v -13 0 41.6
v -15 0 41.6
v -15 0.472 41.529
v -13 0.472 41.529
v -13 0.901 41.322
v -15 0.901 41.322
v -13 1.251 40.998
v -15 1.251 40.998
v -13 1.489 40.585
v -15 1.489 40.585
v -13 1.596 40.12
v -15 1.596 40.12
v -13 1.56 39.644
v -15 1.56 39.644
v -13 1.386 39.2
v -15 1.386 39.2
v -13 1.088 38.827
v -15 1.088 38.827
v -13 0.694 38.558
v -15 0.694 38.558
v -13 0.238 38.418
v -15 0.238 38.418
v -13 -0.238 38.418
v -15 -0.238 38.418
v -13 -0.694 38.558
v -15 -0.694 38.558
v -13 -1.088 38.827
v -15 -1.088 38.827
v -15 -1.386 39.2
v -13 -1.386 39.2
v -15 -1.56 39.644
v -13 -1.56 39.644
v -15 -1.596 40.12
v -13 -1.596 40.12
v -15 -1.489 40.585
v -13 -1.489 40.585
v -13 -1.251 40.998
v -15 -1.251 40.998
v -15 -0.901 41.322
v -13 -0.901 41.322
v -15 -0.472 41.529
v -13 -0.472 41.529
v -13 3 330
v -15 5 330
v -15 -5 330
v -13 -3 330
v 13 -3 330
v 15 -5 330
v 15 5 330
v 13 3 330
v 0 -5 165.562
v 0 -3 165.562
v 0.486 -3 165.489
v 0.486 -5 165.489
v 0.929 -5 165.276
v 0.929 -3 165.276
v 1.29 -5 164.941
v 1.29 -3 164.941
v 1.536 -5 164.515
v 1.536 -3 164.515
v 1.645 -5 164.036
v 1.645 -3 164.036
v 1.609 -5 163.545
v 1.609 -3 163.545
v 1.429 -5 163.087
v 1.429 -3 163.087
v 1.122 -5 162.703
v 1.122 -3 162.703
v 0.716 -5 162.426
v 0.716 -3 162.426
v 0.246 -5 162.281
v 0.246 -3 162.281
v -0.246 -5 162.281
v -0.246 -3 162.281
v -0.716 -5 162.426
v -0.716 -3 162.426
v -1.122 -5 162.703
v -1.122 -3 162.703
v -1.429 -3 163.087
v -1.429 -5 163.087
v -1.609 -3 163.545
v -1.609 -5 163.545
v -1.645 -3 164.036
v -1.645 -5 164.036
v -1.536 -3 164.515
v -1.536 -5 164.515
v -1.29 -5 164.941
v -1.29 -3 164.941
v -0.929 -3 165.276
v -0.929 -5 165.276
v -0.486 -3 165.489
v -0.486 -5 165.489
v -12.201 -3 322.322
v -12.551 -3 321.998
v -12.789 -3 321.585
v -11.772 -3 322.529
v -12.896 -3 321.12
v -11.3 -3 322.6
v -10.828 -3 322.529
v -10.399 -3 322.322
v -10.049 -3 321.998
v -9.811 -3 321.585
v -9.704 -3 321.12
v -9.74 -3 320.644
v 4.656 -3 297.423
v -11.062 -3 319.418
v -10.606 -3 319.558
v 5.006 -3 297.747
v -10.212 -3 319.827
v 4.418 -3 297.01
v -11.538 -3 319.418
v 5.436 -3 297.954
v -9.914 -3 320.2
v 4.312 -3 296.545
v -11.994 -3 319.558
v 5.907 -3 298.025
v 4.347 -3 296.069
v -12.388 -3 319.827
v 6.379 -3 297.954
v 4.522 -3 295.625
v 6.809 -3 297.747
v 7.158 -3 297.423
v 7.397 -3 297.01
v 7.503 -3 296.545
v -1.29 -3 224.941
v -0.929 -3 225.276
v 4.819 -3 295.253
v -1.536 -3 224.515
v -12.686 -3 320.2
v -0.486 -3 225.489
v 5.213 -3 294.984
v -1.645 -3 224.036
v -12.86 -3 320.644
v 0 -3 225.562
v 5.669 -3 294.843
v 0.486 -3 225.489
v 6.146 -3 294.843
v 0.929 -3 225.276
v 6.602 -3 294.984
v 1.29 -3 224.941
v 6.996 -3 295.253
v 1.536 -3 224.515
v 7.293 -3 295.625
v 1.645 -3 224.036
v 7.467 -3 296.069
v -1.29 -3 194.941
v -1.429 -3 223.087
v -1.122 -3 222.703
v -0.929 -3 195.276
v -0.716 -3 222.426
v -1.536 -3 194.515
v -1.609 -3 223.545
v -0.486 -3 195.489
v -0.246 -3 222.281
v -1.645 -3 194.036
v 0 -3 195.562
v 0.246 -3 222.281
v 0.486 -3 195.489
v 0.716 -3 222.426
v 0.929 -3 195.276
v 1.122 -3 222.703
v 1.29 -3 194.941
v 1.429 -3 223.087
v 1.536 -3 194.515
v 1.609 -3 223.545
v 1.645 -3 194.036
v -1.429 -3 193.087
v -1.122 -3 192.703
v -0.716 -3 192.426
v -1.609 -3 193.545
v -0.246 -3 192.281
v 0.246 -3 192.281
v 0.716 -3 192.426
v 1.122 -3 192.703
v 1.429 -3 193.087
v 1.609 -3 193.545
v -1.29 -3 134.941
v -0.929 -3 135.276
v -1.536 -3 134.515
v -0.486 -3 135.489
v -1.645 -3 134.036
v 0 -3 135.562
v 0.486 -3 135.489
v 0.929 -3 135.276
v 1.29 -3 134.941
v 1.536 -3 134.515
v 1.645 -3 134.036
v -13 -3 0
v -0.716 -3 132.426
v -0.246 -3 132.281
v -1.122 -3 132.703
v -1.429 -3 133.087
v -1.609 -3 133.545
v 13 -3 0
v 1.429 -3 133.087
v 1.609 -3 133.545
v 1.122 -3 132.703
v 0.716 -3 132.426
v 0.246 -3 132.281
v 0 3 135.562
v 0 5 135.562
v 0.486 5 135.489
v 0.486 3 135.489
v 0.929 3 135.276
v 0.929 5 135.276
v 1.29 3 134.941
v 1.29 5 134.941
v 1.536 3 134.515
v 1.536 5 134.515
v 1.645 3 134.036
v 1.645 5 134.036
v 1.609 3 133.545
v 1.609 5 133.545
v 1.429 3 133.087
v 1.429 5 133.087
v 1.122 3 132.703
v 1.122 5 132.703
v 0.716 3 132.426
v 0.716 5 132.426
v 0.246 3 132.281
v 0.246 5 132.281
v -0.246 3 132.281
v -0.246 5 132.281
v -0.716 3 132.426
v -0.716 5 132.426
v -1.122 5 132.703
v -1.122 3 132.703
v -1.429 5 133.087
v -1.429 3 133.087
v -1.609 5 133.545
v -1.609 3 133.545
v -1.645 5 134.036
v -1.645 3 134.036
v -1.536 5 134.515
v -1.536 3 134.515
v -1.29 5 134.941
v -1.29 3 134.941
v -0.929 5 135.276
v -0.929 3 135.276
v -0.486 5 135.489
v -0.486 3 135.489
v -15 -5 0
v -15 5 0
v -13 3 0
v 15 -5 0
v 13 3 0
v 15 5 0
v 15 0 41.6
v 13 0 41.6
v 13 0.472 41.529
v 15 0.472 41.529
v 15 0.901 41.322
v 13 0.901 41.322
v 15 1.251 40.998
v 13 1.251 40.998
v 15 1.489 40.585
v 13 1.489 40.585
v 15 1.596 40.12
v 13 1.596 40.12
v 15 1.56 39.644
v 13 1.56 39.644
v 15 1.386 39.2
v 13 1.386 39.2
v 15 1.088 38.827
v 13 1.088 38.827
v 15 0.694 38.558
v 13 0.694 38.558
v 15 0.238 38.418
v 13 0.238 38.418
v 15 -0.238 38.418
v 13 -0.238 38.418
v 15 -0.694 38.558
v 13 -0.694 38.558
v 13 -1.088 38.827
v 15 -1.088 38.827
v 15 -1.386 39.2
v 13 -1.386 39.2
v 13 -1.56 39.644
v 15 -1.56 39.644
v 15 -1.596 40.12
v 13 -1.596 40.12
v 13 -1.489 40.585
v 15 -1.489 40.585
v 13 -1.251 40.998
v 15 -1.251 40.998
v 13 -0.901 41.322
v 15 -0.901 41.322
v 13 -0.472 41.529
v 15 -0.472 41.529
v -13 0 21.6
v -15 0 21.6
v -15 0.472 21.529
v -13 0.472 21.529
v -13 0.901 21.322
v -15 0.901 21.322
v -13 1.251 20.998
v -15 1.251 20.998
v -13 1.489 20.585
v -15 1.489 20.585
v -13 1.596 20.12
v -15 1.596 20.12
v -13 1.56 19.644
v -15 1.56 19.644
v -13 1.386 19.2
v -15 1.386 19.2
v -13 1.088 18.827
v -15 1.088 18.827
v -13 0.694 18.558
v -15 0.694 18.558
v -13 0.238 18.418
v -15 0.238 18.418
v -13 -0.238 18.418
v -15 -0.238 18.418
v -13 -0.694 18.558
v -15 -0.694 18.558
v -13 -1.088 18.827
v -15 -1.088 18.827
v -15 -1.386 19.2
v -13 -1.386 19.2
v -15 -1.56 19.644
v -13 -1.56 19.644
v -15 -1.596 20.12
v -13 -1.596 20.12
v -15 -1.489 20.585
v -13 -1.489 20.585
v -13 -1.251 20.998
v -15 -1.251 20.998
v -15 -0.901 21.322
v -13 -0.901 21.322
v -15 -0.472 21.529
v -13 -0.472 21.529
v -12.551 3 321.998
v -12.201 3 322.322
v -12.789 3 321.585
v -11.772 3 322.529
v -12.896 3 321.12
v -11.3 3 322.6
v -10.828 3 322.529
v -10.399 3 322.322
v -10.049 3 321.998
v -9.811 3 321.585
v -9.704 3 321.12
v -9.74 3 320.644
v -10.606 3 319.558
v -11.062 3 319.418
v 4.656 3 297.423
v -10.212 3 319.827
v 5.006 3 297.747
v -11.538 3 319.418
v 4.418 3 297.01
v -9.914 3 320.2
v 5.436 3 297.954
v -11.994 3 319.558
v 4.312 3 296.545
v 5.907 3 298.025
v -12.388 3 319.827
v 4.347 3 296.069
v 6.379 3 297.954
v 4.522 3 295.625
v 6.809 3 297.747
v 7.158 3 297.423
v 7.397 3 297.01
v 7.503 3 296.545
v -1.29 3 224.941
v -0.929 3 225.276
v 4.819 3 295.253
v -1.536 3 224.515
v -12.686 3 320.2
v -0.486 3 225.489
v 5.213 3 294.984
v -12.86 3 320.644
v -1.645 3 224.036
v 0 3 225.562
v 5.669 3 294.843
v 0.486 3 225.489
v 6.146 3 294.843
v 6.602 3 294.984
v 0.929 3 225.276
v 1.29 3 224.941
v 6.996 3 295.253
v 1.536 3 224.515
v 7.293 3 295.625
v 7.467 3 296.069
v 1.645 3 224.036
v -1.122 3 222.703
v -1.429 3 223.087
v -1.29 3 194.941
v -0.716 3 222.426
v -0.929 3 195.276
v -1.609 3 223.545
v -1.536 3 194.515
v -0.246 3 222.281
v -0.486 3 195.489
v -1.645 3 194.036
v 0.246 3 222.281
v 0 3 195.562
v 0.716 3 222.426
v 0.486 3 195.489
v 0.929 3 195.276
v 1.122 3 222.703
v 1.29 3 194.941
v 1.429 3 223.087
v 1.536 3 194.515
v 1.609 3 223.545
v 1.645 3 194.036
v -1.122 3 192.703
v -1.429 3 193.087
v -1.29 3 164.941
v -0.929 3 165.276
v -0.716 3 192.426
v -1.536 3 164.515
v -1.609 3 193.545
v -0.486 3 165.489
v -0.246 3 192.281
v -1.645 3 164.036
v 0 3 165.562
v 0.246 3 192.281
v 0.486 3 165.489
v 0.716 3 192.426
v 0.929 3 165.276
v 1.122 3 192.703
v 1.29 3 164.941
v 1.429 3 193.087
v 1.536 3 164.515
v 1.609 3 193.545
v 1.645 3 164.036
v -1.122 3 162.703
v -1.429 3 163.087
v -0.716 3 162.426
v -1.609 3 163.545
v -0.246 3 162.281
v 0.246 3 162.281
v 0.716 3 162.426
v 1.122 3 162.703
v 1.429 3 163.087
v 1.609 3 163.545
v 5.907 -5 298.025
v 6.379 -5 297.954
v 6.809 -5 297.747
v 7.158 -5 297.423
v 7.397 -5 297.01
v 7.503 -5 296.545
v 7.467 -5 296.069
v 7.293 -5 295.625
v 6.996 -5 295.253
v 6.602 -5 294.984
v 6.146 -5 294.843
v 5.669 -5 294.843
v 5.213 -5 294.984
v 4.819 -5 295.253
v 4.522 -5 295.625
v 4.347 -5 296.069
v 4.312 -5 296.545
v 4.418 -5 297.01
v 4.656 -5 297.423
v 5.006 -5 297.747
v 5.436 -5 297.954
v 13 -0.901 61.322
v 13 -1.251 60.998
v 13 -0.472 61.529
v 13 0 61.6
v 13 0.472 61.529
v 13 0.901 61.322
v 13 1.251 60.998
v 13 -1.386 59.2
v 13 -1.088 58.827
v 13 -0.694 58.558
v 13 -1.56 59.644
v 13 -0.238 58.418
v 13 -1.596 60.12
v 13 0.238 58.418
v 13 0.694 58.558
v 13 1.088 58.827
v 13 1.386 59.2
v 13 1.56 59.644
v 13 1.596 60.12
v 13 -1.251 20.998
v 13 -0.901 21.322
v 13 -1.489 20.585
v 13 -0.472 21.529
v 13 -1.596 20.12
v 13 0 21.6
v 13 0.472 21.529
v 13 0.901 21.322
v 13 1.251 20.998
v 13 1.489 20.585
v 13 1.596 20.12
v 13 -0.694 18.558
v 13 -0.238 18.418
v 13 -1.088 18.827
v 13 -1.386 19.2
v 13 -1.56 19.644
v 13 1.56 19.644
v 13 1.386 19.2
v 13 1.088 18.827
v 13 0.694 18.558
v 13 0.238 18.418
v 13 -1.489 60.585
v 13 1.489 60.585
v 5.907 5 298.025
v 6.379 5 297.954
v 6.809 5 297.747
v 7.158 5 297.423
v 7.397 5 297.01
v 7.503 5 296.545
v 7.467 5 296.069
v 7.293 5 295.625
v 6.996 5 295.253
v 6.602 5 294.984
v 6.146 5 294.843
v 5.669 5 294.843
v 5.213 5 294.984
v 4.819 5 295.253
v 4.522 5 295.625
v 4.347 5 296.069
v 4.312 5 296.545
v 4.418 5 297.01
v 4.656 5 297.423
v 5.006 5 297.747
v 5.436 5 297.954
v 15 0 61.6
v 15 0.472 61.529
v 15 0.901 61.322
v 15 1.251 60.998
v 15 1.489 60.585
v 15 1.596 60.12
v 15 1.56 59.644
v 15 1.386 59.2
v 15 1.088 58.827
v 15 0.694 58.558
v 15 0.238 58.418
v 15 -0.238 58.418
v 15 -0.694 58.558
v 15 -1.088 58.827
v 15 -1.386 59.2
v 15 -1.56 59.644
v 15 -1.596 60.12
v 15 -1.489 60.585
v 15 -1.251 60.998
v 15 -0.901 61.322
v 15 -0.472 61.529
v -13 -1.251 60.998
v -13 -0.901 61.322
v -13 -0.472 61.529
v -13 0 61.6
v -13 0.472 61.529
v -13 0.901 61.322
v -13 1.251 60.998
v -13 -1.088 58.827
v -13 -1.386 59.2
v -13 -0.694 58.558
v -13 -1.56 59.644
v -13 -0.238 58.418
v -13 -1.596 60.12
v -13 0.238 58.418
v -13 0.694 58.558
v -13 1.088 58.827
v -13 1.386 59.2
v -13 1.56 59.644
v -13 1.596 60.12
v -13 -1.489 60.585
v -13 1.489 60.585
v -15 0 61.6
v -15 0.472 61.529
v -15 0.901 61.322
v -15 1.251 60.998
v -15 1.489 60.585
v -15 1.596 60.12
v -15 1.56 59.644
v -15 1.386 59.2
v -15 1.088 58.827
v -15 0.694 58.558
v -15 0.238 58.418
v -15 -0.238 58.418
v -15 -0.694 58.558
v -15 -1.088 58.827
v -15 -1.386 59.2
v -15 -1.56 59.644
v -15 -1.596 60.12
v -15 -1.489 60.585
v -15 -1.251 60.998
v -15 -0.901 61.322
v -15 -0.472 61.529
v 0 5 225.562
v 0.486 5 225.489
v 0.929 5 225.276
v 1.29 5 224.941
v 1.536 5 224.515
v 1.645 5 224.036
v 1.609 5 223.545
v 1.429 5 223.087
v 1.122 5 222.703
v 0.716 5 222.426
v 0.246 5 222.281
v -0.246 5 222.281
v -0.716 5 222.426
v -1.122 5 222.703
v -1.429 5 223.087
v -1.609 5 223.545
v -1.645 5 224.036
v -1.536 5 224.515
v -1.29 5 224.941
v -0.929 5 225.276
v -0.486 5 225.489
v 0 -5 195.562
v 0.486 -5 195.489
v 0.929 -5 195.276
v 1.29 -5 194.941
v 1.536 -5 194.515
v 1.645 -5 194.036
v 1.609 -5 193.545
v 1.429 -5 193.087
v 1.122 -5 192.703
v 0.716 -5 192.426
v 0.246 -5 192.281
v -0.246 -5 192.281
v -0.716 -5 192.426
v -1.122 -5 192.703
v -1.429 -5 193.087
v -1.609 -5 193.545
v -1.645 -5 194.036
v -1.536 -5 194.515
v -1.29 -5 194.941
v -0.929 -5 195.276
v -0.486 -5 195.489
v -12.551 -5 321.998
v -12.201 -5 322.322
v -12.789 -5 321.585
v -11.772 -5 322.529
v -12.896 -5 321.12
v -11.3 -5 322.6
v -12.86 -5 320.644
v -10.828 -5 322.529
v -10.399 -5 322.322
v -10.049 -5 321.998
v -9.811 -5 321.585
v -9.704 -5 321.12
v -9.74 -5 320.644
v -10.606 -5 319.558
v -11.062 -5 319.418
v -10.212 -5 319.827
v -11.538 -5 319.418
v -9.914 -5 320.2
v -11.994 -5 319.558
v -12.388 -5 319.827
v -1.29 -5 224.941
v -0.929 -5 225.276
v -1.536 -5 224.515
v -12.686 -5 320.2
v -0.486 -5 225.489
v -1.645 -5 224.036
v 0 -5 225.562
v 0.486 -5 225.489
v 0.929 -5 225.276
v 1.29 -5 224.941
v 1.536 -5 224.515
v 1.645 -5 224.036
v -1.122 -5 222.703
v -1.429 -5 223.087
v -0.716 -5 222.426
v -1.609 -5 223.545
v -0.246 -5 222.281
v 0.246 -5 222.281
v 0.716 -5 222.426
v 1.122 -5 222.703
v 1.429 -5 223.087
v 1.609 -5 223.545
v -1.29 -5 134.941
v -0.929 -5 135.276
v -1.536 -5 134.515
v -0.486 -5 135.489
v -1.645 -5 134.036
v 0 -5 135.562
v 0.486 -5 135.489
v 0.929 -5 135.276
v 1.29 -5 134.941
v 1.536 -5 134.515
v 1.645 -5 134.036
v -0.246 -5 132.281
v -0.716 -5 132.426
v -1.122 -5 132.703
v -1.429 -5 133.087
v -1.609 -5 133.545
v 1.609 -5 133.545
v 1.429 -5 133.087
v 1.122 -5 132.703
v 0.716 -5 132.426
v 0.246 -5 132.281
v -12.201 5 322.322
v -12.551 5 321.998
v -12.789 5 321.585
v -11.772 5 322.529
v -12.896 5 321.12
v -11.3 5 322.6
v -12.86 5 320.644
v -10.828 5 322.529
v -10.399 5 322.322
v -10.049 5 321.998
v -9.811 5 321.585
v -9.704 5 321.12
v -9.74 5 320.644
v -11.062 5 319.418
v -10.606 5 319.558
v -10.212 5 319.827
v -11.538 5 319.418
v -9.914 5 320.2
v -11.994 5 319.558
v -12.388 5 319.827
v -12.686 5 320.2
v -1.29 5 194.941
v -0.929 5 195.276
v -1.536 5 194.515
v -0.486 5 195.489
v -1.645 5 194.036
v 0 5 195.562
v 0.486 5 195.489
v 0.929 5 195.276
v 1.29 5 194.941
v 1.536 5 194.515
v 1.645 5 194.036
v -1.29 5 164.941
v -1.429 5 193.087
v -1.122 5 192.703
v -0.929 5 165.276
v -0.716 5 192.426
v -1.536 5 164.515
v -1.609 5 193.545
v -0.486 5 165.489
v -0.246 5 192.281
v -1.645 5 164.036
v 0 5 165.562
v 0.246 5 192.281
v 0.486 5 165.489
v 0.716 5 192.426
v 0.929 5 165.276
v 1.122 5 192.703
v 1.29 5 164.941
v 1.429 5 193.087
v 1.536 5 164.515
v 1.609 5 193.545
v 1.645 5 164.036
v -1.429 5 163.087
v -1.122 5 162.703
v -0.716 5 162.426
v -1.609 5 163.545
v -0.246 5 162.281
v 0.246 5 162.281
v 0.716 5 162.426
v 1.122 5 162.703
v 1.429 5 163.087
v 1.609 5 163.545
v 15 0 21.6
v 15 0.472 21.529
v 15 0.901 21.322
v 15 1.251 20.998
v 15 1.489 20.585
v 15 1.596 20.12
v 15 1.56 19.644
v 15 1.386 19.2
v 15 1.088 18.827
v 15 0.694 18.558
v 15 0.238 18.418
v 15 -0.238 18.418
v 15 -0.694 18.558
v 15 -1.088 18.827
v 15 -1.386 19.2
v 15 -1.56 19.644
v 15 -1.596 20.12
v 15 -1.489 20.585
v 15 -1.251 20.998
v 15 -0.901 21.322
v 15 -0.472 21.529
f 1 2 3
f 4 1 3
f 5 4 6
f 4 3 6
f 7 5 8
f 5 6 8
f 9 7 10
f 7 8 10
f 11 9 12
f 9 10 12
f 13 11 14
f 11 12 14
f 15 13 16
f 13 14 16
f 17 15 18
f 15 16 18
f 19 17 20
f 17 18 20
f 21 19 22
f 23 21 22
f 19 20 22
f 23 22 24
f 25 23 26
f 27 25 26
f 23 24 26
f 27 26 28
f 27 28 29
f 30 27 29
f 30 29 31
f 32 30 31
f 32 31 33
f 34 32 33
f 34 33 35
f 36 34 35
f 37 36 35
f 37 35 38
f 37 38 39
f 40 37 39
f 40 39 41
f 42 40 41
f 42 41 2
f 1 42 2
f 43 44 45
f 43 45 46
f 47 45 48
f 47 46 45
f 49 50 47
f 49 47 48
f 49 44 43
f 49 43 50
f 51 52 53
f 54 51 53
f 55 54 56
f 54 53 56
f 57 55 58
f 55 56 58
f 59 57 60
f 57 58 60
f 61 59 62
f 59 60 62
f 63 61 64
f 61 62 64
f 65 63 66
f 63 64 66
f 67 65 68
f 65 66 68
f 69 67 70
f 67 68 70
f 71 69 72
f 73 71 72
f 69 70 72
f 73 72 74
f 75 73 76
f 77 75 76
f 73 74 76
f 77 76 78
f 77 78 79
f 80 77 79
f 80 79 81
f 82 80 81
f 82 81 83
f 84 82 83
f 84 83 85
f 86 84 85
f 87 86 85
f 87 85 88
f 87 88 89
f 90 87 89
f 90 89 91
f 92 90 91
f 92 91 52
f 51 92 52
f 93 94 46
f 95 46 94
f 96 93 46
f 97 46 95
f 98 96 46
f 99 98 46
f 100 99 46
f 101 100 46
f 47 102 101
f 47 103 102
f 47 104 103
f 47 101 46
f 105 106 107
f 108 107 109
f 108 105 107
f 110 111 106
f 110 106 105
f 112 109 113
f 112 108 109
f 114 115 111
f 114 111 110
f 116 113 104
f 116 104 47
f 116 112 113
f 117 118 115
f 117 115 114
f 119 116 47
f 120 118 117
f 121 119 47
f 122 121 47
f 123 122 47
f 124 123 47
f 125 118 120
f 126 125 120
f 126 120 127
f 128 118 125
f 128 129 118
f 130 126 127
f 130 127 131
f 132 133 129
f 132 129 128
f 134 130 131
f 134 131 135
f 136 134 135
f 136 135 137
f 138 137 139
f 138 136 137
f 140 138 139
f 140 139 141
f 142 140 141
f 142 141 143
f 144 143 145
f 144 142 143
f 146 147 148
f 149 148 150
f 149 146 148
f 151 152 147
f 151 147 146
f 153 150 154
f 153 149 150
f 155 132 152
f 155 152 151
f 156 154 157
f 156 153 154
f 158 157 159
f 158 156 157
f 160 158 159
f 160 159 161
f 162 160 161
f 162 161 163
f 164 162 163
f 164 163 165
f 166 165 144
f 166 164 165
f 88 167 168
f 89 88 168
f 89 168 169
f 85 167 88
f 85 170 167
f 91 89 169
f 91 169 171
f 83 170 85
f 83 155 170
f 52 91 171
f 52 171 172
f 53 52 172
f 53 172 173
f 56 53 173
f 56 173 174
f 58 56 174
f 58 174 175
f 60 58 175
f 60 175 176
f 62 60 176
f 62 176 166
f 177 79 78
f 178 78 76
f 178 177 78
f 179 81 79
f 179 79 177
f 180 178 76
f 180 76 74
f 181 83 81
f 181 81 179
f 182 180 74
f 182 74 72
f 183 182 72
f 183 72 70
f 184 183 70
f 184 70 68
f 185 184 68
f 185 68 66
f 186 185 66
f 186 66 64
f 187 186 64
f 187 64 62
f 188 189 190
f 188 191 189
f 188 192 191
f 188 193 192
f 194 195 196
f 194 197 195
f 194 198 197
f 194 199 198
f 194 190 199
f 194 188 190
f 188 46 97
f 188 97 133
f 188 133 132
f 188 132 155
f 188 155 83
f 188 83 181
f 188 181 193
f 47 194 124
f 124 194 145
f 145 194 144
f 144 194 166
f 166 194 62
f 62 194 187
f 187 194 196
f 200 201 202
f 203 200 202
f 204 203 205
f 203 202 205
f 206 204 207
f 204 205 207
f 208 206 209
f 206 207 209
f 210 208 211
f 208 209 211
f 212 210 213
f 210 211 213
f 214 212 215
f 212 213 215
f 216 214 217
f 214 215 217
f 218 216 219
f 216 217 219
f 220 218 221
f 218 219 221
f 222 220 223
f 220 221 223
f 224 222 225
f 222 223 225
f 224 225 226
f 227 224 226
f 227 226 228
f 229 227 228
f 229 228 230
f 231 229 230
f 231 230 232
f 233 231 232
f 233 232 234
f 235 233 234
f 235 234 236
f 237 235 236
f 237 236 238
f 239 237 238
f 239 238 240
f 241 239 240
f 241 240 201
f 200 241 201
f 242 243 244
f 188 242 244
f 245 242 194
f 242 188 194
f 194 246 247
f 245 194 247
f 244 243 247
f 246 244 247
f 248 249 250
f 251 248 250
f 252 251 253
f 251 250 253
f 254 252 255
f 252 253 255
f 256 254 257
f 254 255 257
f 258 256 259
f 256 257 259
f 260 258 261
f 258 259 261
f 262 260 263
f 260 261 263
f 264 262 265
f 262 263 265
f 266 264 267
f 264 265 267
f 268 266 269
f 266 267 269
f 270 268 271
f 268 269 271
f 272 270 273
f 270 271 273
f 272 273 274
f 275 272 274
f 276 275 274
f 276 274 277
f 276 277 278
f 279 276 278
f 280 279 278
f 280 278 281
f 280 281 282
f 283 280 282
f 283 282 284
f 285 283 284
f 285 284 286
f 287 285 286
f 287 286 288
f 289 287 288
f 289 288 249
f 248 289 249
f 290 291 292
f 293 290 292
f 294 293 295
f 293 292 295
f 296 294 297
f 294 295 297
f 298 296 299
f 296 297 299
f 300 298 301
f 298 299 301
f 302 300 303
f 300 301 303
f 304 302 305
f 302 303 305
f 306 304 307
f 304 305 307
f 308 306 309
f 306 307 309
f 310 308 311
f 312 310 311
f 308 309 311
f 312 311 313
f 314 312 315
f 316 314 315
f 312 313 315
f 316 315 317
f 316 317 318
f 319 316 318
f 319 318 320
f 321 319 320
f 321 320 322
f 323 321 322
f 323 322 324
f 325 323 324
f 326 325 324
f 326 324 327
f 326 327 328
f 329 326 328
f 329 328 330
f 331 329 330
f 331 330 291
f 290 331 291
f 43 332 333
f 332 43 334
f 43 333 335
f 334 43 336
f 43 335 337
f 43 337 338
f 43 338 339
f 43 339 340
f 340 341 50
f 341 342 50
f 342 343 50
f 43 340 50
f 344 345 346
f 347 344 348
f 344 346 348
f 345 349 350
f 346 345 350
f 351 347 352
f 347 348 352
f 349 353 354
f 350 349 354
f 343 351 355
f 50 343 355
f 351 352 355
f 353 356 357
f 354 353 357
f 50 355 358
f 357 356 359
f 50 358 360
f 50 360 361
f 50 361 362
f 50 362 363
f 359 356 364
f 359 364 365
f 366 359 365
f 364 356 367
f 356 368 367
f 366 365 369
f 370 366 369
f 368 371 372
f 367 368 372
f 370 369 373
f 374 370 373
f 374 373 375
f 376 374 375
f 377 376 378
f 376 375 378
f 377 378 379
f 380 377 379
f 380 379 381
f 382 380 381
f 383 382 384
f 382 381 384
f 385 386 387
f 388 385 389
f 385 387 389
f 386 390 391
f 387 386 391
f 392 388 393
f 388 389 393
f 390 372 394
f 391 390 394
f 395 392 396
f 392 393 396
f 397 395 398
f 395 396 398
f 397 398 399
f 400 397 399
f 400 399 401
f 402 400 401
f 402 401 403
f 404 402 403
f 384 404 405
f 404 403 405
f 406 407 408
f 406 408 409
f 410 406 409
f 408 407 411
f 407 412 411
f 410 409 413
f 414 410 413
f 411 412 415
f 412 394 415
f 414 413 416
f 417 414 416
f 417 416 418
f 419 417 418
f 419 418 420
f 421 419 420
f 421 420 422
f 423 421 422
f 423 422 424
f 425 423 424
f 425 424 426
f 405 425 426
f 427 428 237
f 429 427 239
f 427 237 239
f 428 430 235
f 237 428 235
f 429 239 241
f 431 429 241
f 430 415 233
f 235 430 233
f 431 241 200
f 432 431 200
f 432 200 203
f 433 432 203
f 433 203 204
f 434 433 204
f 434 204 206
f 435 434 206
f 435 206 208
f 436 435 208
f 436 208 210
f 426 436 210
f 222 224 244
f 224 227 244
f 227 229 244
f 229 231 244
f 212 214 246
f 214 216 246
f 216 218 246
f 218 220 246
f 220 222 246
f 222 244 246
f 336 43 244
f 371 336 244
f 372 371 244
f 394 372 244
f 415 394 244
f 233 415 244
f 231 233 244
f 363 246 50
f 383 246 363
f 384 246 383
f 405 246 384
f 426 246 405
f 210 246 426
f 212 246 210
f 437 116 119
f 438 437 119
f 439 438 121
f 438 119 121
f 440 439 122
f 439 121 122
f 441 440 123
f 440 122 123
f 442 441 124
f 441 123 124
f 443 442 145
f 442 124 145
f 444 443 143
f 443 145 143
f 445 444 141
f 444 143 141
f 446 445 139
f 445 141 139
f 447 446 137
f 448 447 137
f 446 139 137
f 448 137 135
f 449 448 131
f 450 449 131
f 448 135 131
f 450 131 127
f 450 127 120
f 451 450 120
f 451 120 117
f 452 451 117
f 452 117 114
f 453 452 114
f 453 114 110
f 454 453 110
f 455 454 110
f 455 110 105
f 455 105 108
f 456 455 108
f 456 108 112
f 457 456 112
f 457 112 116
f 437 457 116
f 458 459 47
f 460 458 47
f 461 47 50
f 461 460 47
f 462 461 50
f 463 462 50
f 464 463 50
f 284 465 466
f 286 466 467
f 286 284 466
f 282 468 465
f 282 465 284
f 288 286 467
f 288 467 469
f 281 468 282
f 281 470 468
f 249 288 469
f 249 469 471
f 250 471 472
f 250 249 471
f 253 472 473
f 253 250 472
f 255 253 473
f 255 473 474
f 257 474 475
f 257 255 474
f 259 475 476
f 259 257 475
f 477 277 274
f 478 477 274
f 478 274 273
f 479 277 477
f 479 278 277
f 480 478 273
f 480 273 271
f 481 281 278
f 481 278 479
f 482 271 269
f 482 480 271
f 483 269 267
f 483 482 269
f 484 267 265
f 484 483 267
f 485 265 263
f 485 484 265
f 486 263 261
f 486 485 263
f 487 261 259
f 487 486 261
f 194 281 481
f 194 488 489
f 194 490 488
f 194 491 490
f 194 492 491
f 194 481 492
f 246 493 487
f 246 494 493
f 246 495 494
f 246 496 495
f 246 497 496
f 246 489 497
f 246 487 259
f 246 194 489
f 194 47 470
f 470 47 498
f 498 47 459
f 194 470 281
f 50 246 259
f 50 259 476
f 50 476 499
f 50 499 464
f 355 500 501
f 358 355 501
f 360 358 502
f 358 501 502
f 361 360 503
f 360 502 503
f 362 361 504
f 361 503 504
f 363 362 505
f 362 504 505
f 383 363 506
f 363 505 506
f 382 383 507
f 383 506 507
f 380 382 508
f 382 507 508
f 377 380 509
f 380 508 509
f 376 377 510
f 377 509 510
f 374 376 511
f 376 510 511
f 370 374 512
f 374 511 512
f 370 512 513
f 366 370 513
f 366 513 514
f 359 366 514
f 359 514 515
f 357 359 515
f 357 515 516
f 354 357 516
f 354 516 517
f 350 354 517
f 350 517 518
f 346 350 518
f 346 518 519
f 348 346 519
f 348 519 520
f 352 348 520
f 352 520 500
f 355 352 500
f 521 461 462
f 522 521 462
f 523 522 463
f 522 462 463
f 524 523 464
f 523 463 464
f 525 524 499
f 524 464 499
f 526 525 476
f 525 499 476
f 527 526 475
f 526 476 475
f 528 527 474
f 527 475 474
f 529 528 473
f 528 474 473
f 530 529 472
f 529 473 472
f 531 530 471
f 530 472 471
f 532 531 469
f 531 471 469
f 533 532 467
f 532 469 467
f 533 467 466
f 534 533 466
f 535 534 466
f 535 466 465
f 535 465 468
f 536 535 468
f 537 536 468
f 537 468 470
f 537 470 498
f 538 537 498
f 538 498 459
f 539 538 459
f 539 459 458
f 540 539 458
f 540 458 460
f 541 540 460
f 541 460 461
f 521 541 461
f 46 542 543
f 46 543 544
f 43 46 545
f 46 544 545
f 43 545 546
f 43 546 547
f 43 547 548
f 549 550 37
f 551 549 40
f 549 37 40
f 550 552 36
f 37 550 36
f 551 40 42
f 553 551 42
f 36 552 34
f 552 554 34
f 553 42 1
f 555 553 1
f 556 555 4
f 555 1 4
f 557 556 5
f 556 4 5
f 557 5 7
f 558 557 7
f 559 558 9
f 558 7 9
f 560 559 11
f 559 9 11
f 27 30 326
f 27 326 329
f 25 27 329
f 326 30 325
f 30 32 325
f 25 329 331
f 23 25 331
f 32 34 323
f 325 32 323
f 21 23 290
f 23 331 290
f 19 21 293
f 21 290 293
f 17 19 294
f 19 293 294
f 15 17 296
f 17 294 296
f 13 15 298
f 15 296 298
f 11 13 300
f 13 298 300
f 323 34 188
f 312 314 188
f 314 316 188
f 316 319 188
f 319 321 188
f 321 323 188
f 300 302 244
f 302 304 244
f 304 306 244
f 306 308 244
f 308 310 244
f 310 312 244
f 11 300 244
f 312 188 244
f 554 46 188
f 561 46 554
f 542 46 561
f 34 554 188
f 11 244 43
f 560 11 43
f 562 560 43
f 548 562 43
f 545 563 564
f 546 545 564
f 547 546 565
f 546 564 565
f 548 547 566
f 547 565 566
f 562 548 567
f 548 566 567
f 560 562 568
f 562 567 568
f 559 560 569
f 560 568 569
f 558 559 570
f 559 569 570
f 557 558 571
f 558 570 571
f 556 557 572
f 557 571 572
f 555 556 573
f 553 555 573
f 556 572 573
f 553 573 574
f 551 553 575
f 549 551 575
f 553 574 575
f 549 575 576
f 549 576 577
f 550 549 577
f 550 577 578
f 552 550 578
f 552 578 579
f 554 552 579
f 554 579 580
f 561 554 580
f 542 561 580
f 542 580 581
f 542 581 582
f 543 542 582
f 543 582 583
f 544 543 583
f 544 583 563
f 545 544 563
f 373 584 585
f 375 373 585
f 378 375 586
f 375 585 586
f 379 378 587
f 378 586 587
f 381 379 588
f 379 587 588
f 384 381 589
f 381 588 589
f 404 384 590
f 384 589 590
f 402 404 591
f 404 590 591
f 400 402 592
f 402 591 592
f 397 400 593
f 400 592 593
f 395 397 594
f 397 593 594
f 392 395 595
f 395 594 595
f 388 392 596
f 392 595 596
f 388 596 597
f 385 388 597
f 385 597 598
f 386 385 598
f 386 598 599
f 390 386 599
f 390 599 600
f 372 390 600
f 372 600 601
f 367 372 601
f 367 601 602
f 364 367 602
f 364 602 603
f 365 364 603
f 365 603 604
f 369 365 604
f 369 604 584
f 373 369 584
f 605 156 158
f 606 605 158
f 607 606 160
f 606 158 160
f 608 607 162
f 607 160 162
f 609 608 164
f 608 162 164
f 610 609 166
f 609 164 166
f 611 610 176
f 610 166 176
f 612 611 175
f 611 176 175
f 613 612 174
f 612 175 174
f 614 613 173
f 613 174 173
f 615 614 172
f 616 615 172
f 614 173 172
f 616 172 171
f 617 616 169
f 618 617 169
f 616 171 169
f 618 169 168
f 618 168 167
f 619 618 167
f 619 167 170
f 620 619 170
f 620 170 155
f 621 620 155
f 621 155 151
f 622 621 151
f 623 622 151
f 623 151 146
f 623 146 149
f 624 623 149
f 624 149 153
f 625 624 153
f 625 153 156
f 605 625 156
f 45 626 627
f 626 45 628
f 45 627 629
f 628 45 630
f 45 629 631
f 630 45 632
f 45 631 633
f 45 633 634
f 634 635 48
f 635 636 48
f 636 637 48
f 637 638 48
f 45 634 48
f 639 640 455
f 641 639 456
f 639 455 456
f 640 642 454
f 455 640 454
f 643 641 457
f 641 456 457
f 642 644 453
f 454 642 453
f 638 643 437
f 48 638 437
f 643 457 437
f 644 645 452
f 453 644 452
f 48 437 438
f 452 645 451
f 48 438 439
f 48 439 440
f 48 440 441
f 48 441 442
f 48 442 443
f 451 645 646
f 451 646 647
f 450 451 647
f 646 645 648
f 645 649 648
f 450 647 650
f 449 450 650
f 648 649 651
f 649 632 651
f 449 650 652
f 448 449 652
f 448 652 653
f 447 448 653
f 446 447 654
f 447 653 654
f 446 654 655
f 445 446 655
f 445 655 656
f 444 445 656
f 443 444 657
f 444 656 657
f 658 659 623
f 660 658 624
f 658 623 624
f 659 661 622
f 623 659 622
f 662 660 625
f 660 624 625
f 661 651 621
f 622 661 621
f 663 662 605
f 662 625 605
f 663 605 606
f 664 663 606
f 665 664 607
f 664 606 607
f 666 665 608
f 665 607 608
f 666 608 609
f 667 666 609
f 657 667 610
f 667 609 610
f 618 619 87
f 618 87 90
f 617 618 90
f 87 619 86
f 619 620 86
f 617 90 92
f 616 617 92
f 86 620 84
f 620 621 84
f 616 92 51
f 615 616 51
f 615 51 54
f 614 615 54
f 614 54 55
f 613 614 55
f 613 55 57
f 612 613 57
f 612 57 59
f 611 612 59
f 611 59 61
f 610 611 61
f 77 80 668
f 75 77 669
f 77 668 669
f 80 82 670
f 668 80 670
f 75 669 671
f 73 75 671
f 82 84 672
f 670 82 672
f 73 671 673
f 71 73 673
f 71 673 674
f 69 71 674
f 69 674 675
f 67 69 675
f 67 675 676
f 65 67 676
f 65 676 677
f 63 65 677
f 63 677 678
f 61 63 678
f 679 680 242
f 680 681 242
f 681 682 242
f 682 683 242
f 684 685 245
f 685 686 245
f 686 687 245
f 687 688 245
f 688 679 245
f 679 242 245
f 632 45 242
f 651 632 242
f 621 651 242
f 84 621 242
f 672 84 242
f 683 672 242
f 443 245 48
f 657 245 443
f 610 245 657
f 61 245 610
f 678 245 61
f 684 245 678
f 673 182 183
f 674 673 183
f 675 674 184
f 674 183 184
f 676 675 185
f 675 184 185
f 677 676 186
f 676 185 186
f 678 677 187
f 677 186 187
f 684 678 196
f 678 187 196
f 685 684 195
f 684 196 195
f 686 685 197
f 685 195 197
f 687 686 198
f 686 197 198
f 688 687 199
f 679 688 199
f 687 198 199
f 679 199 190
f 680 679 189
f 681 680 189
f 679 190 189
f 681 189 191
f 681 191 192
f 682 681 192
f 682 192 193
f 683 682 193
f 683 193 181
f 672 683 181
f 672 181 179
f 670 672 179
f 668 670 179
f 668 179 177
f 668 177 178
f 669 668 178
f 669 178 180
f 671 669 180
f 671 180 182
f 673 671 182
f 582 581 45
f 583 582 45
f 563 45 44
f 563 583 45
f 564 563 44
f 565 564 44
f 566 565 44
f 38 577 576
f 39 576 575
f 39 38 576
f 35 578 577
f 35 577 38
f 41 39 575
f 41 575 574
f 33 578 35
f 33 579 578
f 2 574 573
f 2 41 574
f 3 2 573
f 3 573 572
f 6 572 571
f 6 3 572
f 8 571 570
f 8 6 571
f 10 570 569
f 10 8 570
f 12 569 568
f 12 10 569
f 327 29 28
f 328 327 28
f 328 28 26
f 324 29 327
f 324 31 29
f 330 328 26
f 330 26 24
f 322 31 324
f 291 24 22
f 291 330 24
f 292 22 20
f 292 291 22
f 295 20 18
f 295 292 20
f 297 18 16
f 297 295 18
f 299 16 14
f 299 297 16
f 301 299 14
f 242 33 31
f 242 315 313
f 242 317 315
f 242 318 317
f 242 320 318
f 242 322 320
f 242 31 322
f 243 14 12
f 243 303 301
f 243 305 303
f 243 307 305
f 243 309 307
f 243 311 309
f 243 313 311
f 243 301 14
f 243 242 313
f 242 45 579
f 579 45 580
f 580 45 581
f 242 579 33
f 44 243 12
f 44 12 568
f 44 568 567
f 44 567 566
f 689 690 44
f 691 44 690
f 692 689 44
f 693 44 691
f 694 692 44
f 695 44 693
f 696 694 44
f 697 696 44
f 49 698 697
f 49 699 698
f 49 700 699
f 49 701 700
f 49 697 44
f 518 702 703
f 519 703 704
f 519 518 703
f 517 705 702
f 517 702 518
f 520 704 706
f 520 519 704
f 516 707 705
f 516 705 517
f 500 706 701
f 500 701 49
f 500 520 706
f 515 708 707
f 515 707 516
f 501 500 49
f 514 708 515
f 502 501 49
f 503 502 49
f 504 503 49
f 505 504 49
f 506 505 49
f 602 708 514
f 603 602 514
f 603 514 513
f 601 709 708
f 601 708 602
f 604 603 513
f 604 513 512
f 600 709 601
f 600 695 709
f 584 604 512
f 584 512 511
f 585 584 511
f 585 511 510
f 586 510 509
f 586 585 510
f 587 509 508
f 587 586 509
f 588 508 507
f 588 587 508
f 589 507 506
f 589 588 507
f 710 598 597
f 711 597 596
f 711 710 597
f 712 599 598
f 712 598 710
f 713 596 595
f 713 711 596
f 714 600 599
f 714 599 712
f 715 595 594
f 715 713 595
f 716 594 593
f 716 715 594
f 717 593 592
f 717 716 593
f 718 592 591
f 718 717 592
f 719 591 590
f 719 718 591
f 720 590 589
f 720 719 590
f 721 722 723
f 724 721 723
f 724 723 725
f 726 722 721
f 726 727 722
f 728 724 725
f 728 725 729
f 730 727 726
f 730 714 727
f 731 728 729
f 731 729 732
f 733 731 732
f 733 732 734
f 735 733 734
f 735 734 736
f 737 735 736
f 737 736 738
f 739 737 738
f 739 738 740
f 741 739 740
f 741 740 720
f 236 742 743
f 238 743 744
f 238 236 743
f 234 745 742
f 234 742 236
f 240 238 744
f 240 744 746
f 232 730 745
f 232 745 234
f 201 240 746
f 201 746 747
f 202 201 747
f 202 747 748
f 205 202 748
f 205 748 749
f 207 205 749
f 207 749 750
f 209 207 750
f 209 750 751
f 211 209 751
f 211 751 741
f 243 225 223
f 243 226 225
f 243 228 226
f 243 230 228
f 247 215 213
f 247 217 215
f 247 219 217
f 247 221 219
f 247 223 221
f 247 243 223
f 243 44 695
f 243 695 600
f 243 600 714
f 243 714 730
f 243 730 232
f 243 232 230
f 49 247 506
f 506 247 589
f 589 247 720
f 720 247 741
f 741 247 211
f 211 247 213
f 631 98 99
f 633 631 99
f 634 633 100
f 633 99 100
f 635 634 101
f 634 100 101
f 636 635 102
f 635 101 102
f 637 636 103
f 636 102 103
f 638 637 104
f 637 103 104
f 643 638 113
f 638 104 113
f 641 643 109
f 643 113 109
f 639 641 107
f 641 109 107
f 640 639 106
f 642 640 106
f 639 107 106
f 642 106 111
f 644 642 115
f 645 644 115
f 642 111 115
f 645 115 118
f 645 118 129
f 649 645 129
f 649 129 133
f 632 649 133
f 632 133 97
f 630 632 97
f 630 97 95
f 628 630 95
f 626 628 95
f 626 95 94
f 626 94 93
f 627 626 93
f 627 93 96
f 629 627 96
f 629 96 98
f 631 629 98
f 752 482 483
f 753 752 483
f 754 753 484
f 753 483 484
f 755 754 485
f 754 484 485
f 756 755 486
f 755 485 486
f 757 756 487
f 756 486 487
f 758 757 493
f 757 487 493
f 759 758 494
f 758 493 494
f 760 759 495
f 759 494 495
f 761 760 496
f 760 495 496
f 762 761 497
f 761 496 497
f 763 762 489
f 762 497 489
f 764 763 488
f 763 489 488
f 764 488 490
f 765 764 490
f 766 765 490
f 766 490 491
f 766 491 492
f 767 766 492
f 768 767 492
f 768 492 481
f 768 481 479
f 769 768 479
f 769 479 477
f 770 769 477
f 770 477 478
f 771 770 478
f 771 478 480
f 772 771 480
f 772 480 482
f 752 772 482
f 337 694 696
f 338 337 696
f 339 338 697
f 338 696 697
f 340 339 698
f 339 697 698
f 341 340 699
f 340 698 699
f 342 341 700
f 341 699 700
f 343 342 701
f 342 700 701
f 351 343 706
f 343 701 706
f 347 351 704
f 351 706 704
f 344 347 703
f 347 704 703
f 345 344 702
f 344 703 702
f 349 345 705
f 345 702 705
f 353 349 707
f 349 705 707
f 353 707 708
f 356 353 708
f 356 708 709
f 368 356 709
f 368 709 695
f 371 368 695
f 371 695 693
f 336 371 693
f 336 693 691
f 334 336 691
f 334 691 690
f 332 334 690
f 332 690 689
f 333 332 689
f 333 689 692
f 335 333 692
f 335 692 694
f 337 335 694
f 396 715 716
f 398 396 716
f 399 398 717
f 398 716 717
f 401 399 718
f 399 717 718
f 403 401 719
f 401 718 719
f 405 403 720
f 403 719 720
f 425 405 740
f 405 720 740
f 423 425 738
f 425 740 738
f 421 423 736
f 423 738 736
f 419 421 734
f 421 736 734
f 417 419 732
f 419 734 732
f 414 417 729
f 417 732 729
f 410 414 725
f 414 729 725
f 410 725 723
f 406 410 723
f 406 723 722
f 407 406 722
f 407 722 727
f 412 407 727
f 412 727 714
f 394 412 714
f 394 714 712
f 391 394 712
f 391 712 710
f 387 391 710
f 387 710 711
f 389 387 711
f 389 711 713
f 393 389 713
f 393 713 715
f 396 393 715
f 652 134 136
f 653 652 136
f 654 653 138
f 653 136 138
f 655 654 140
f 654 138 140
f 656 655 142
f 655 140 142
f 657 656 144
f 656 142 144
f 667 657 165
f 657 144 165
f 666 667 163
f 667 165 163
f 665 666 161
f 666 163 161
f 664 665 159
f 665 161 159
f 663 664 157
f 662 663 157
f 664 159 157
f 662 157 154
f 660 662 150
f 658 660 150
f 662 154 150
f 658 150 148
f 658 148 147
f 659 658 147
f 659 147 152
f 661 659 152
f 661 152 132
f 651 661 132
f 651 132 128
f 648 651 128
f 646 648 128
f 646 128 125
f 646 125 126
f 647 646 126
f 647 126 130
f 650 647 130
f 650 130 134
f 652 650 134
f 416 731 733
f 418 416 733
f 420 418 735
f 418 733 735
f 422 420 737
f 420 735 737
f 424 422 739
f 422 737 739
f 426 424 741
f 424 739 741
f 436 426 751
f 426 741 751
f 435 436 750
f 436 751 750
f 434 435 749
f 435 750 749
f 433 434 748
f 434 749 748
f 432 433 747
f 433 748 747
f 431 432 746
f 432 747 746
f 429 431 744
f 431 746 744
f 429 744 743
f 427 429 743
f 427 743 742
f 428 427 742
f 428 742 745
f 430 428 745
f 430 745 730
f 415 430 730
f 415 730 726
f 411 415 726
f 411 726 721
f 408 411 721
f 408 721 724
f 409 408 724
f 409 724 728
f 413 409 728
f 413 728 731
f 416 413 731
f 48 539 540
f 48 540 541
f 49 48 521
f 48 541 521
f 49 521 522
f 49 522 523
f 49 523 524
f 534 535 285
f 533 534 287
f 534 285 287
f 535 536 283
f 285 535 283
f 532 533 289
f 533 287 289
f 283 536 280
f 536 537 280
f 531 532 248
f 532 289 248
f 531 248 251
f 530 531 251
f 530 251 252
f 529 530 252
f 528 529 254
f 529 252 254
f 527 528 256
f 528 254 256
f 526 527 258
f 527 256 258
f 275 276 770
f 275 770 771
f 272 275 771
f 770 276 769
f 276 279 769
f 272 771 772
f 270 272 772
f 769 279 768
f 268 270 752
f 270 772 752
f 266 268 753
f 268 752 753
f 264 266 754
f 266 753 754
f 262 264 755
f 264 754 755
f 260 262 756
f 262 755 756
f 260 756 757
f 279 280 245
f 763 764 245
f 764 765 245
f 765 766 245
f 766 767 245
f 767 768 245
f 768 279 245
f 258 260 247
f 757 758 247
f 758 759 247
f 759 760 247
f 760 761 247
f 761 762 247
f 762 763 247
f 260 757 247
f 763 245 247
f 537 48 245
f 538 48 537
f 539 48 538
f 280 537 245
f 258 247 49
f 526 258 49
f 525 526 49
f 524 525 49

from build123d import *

# Parameters (mm, degrees)
SKETCH_1_W          = 30
SKETCH_1_H          = 10
SKETCH_1_W_2        = 26
SKETCH_1_H_2        = 6
EXTRUDE_1_DEPTH     = 330
SKETCH_2_R          = 1.6
CUT_EXTRUDE_1_DEPTH = 331.492057393
SKETCH_3_R          = 1.6
SKETCH_3_R_2        = 1.65
CUT_EXTRUDE_2_DEPTH = 331.492057393
SKETCH_4_R          = 1.6
CUT_EXTRUDE_3_DEPTH = 332.398551596


with BuildPart() as part:
    # 草图1 → 凸台-拉伸1 (new body)
    with BuildSketch(Plane.XY):
        Rectangle(SKETCH_1_W, SKETCH_1_H)
        Rectangle(SKETCH_1_W_2, SKETCH_1_H_2, mode=Mode.SUBTRACT)
    extrude(amount=EXTRUDE_1_DEPTH)

    # 草图2 → 切除-拉伸1 (cut, through all)
    with BuildSketch(Plane(origin=(0, 5, 0), x_dir=(1, 0, 0), z_dir=(0, 1, 0))):
        with Locations(Location((-11.3, -321, 0), (0, 0, 270))):
            Circle(SKETCH_2_R)
    extrude(amount=-CUT_EXTRUDE_1_DEPTH, mode=Mode.SUBTRACT)

    # 草图3 → 切除-拉伸2 (cut, through all)
    with BuildSketch(Plane(origin=(0, 5, 0), x_dir=(1, 0, 0), z_dir=(0, 1, 0))):
        with Locations(Location((5.907293091, -296.425438671, 0), (0, 0, 270))):
            Circle(SKETCH_3_R)
        with Locations(Location((0, -163.912345182, 0), (0, 0, 270))):
            Circle(SKETCH_3_R_2)
        with Locations(Location((0, -133.912345182, 0), (0, 0, 270))):
            Circle(SKETCH_3_R_2)
        with Locations(Location((0, -223.912345182, 0), (0, 0, 270))):
            Circle(SKETCH_3_R_2)
        with Locations(Location((0, -193.912345182, 0), (0, 0, 270))):
            Circle(SKETCH_3_R_2)
    extrude(amount=-CUT_EXTRUDE_2_DEPTH, mode=Mode.SUBTRACT)

    # 草图4 → 切除-拉伸3 (cut, through all)
    with BuildSketch(Plane.ZY.offset(15)):
        with Locations((20, 0)):
            Circle(SKETCH_4_R)
        with Locations((40, 0)):
            Circle(SKETCH_4_R)
        with Locations((60, 0)):
            Circle(SKETCH_4_R)
    extrude(amount=-CUT_EXTRUDE_3_DEPTH, mode=Mode.SUBTRACT)


solid = part.part
